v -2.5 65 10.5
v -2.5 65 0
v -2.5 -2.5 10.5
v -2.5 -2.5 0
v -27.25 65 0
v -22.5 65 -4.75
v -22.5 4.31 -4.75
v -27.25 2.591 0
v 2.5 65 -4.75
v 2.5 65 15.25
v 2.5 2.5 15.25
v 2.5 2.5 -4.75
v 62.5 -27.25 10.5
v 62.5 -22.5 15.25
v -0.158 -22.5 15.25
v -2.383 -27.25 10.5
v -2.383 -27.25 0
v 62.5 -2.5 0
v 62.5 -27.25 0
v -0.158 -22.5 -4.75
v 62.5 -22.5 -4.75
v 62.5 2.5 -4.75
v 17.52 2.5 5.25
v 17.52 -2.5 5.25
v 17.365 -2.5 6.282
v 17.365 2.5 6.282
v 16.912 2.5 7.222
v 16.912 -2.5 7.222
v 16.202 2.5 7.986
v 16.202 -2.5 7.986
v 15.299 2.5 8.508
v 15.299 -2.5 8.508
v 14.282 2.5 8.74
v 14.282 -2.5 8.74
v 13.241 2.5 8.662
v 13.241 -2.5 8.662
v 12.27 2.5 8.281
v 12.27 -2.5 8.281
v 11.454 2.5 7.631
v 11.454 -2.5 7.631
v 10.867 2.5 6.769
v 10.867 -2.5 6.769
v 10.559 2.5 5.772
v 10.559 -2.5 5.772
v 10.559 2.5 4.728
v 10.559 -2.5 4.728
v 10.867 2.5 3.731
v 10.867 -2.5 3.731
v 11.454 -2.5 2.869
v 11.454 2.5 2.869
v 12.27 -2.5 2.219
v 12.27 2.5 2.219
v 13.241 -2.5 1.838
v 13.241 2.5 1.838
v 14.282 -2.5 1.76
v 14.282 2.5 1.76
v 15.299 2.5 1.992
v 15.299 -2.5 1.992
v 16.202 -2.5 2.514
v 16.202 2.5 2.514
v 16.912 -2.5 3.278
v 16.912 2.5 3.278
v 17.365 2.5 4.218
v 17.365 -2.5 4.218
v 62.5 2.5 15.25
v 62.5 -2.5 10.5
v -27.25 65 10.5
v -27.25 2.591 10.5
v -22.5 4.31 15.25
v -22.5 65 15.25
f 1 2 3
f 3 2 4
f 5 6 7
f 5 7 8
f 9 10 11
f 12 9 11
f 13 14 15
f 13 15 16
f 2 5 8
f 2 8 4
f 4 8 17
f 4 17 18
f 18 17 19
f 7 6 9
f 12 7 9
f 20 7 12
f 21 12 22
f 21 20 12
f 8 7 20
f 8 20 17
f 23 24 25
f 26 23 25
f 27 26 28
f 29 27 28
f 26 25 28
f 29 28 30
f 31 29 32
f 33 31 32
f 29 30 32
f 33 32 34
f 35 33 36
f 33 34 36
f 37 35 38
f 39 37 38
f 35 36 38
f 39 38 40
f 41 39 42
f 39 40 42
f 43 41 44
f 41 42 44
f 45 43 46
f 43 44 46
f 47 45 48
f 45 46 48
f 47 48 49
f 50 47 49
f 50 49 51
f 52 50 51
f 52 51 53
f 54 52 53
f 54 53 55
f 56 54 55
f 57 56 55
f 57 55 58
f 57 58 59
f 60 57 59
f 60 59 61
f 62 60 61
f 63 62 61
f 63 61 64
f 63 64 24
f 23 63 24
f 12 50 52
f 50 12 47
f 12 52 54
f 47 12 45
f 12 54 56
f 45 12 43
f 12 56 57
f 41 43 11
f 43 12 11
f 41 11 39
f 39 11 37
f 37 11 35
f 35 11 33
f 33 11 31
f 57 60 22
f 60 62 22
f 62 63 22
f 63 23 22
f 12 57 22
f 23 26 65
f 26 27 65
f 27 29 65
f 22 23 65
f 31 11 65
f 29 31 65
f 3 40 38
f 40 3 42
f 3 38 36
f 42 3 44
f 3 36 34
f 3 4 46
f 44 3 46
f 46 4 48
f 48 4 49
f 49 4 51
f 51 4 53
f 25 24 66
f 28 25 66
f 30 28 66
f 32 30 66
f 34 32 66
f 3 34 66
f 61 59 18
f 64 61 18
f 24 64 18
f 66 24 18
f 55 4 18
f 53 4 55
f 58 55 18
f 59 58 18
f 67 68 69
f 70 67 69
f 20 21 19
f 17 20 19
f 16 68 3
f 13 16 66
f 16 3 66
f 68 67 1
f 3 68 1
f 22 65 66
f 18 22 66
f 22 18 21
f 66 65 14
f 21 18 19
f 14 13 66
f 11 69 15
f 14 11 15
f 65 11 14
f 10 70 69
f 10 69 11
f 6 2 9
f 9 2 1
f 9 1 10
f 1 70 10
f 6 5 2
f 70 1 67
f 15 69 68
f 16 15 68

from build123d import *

# Parameters (mm, degrees)
F0_W        = 5
F0_H        = 62.5
F0_H_2      = 5
F0_W_2      = 60
F1_DEPTH    = 10.5
F2_W        = 5
F2_H        = 62.5
F2_W_2      = 25
F2_W_3      = 65
F2_H_2      = 25
F3_DEPTH    = 4.75
F4_W        = 65
F4_H        = 25
F4_W_2      = 5
F4_H_2      = 62.5
F4_W_3      = 25
F5_DEPTH    = 4.75
F6_T1_DEPTH = 88.2168298797
F7_T1_DEPTH = 56.9578285833
F7_T3_DEPTH = 90.7168298797
F7_T5_DEPTH = 88.2168298797
F7_T7_DEPTH = 64.7680782592
F9_D        = 7


# Not quite as in the source:
# - a fillet or chamfer that OpenCascade refuses, or shapes differently, is made with other operations: its cross-section is extruded or revolved along the edge and cut away or added


with BuildPart() as f1:
    # F0 (on Top) → F1 (new body)
    with BuildSketch(Plane.XY):
        with Locations((0, 33.75)):
            Rectangle(F0_W, F0_H)
        Rectangle(F0_W, F0_H_2)
        with Locations((32.5, 0)):
            Rectangle(F0_W_2, F0_H_2)
    extrude(amount=F1_DEPTH)

    # F2 (on face) → F3 (join)
    with BuildSketch(Plane.XY.offset(10.5)):
        with Locations((0, 33.75)):
            Rectangle(F2_W, F2_H)
        Polygon((2.5, 2.5), (-2.5, 2.5), (-2.5, -2.5), (62.5, -2.5), (62.5, 2.5), align=None)
        Polygon((-2.5, -2.5), (-2.5, 2.5), (-27.5, 2.5), (-2.5, -27.5), align=None)
        with Locations((-15, 33.75)):
            Rectangle(F2_W_2, F2_H)
        with Locations((30, -15)):
            Rectangle(F2_W_3, F2_H_2)
    extrude(amount=F3_DEPTH)

    # F4 (on face) → F5 (join)
    with BuildSketch(Plane(origin=(0, 0, 0), x_dir=(1, 0, 0), z_dir=(0, 0, -1))):
        with Locations((30, 15)):
            Rectangle(F4_W, F4_H)
        Polygon((2.5, -2.5), (62.5, -2.5), (62.5, 2.5), (-2.5, 2.5), (-2.5, -2.5), align=None)
        Polygon((-27.5, -2.5), (-2.5, -2.5), (-2.5, 2.5), (-2.5, 27.5), align=None)
        with Locations((0, -33.75)):
            Rectangle(F4_W_2, F4_H_2)
        with Locations((-15, -33.75)):
            Rectangle(F4_W_3, F4_H_2)
    extrude(amount=F5_DEPTH)

    # F6: chamfer of 5 on 1 edges, made by hand

    # F6_s2 → F6_t1 (cut)
    with BuildSketch(Plane.XZ.offset(-77.8584149398)):
        Polygon((-27.5, 10.25), (-22.5, 15.25), (-27.5, 15.25), align=None)
    extrude(amount=F6_T1_DEPTH, mode=Mode.SUBTRACT)

    # F7: chamfer of 5 on 5 edges, made by hand

    # F7_s2 → F7_t1 (cut)
    with BuildSketch(Plane(origin=(-15.7317566489, 18.8781079787, 0), x_dir=(0, 0, 1), z_dir=(0.6401843997, -0.7682212796, 0))):
        Polygon((15.25, 14.5256241898), (10.25, 19.5256241898), (15.25, 19.5256241898), align=None)
    extrude(amount=F7_T1_DEPTH, mode=Mode.SUBTRACT)

    # F7_s4 → F7_t3 (cut)
    with BuildSketch(Plane.YZ.offset(-15.3584149398)):
        Polygon((-22.5, 15.25), (-27.5, 10.25), (-27.5, 15.25), align=None)
        Polygon((-22.5, -4.75), (-27.5, 0.25), (-27.5, -4.75), align=None)
    extrude(amount=F7_T3_DEPTH, mode=Mode.SUBTRACT)

    # F7_s6 → F7_t5 (cut)
    with BuildSketch(Plane.XZ.offset(-77.8584149398)):
        Polygon((-22.5, -4.75), (-27.5, 0.25), (-27.5, -4.75), align=None)
    extrude(amount=F7_T5_DEPTH, mode=Mode.SUBTRACT)

    # F7_s8 → F7_t7 (cut)
    with BuildSketch(Plane(origin=(20.7317566489, -24.8781079787, 0), x_dir=(0, 0, 1), z_dir=(-0.6401843997, 0.7682212796, 0))):
        Polygon((-4.75, -14.5256241898), (0.25, -19.5256241898), (-4.75, -19.5256241898), align=None)
    extrude(amount=F7_T7_DEPTH, mode=Mode.SUBTRACT)

    # F9 (through all)
    with Locations(Plane(origin=(0, 2.5, 0), x_dir=(-1, 0, 0), z_dir=(0, 1, 0))):
        with Locations((-14.02, 5.25)):
            Hole(F9_D / 2)


solid = f1.part
